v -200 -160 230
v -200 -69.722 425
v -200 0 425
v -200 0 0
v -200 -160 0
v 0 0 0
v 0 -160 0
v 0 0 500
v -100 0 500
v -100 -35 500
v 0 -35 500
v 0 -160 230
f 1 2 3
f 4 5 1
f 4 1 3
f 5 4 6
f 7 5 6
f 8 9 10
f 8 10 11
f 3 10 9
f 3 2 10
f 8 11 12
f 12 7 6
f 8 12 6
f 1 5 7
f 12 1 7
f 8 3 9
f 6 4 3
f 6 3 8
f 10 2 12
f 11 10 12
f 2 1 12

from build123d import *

# Parameters (mm, degrees)
F0_W     = 200
F0_H     = 160
F1_DEPTH = 500
F2_SIZE2 = 75
F2_SIZE  = 100
F3_SIZE2 = 270
F3_SIZE  = 125


with BuildPart() as f1:
    # F0 (on Top) → F1 (new body)
    with BuildSketch(Plane.XY):
        with Locations((-100, -80)):
            Rectangle(F0_W, F0_H)
    extrude(amount=F1_DEPTH)

    # F2
    f2_edges = [f1.edges().sort_by_distance(p)[0] for p in [
        (-200, -80, 500),
    ]]
    f2_side = f1.faces().sort_by_distance((-100, -80, 500))[0]
    chamfer(f2_edges, length=F2_SIZE, length2=F2_SIZE2, reference=f2_side)

    # F3
    f3_edges = [f1.edges().sort_by_distance(p)[0] for p in [
        (-50, -160, 500),
    ]]
    f3_side = f1.faces().sort_by_distance((-50, -80, 500))[0]
    chamfer(f3_edges, length=F3_SIZE, length2=F3_SIZE2, reference=f3_side)


solid = f1.part
